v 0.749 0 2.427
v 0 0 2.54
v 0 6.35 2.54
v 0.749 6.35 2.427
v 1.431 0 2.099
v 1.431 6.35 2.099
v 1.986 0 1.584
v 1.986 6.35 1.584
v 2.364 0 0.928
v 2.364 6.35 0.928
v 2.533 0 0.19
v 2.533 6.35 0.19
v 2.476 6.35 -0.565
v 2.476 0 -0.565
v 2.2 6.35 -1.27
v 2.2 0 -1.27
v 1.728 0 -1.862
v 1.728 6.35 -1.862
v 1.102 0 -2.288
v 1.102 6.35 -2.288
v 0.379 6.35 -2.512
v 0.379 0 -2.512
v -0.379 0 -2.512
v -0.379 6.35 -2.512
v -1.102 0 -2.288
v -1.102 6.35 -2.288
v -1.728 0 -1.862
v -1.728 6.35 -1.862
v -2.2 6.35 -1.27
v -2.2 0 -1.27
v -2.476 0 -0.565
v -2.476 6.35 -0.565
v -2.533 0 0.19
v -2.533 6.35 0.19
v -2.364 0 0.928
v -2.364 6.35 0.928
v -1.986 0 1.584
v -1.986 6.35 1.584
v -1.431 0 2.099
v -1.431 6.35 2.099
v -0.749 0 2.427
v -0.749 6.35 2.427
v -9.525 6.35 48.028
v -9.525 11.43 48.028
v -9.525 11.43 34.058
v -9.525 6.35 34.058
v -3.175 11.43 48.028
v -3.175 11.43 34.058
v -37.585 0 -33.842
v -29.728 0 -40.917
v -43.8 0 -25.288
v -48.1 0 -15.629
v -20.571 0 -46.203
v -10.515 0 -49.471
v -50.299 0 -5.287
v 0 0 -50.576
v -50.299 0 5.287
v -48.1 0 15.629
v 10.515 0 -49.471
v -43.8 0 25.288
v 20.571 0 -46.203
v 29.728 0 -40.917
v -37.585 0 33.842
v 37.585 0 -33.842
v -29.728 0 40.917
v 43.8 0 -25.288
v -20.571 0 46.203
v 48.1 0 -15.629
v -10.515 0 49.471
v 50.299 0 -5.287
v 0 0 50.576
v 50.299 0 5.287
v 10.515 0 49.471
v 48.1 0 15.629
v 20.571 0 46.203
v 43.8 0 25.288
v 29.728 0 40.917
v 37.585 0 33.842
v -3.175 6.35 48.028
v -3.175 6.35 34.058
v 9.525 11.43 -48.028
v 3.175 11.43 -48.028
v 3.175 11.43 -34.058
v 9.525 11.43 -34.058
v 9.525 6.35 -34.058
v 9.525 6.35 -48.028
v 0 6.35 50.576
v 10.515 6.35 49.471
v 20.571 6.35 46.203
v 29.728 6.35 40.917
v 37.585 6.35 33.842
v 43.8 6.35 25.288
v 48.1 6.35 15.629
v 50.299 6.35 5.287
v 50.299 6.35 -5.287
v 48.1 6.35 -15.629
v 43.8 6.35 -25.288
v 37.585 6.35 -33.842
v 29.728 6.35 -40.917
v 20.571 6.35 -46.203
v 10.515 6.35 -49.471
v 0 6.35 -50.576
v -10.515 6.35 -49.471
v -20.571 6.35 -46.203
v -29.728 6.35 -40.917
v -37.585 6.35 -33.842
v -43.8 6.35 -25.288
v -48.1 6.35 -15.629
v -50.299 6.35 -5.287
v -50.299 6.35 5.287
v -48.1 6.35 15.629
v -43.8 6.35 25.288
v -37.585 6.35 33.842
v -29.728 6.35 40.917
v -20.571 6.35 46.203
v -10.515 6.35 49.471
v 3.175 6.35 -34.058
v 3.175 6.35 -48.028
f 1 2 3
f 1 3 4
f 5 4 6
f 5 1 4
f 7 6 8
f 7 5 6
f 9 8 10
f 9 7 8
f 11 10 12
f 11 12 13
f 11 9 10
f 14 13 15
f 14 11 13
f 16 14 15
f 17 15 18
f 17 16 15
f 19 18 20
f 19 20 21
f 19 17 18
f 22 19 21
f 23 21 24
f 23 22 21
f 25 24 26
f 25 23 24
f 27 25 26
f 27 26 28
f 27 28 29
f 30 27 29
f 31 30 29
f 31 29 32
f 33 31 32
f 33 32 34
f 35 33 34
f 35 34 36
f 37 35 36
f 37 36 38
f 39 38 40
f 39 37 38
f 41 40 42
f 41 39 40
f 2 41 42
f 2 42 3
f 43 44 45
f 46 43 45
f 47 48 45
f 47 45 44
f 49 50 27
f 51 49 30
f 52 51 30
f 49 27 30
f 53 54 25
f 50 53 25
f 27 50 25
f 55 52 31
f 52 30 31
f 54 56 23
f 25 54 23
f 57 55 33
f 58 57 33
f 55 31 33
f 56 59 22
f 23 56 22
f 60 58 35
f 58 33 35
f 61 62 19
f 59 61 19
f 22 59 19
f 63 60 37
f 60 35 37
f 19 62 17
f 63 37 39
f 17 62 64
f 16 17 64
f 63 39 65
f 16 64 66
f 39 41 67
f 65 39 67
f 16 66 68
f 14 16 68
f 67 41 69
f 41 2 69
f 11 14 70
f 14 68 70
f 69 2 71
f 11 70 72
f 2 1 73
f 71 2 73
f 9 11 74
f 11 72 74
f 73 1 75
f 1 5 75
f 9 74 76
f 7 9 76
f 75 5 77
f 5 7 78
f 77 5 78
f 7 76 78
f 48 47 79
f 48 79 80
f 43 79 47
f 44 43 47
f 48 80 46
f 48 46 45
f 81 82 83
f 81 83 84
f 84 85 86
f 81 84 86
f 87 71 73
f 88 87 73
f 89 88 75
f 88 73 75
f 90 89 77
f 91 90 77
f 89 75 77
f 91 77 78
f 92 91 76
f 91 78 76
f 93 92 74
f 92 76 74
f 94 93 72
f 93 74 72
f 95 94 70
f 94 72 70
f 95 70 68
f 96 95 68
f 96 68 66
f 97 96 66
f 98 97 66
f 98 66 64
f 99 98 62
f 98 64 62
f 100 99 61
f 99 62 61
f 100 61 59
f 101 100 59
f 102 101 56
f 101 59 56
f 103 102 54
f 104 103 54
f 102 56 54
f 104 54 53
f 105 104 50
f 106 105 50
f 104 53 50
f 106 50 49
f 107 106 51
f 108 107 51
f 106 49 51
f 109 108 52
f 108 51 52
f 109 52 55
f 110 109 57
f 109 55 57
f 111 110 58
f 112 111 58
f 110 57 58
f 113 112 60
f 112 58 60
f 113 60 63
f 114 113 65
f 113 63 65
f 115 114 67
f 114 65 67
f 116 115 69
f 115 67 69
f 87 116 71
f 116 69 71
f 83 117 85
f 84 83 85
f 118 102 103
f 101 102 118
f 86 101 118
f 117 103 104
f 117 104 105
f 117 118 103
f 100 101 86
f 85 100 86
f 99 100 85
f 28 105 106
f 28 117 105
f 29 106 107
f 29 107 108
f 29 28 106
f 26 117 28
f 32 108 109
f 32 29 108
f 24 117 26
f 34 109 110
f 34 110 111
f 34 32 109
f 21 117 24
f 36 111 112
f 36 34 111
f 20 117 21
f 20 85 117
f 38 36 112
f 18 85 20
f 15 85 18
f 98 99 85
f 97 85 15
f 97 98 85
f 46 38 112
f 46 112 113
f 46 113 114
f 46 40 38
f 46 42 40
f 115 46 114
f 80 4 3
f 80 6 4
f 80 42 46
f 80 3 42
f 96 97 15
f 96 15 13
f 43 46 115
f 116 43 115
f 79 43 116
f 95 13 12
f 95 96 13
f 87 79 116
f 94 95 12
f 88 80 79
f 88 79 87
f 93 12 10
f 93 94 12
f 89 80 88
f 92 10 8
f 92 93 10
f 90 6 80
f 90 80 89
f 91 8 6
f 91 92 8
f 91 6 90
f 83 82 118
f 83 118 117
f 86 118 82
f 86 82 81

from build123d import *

# Parameters (mm, degrees)
SKETCH1_R           = 50.575792326
SKETCH1_R_2         = 2.54
BOSS_EXTRUDE1_DEPTH = 6.35
SKETCH2_W           = 13.97
SKETCH2_H           = 5.08
BOSS_EXTRUDE3_DEPTH = 9.525
SKETCH3_W           = 13.97
SKETCH3_H           = 5.08
CUT_EXTRUDE1_DEPTH  = 3.175
CIRPATTERN2_COUNT   = 2
SKETCH4_W           = 13.97
SKETCH4_H           = 5.08
CUT_EXTRUDE2_DEPTH  = 3.175


with BuildPart() as part:
    # Sketch1 → Boss-Extrude1 (new body)
    with BuildSketch(Plane(origin=(0, 0, 0), x_dir=(1, 0, 0), z_dir=(0, 1, 0))):
        Circle(SKETCH1_R)
        Circle(SKETCH1_R_2, mode=Mode.SUBTRACT)
    extrude(amount=BOSS_EXTRUDE1_DEPTH)

    # Sketch2 → Boss-Extrude3 (add)
    with BuildSketch(Plane(origin=(0, 0, 0), x_dir=(0, 0, -1), z_dir=(1, 0, 0))):
        with Locations((-41.043352, 8.89)):
            Rectangle(SKETCH2_W, SKETCH2_H)
    boss_extrude3 = extrude(amount=-BOSS_EXTRUDE3_DEPTH)

    # Sketch3 → Cut-Extrude1 (cut)
    with BuildSketch(Plane(origin=(0, 0, 0), x_dir=(0, 0, -1), z_dir=(1, 0, 0))):
        with Locations((-41.043352, 8.89)):
            Rectangle(SKETCH3_W, SKETCH3_H)
    extrude(amount=-CUT_EXTRUDE1_DEPTH, mode=Mode.SUBTRACT)

    # CirPattern2: Boss-Extrude3 ×2 about axis
    cirpattern2_axis = Axis((0, 6.35, 0), (0, 1, 0))
    for i in range(1, CIRPATTERN2_COUNT):
        add(boss_extrude3.rotate(cirpattern2_axis, i * 360 / CIRPATTERN2_COUNT))

    # Sketch4 → Cut-Extrude2 (cut)
    with BuildSketch(Plane.ZY):
        with Locations((-41.043352, 8.89)):
            Rectangle(SKETCH4_W, SKETCH4_H)
    extrude(amount=-CUT_EXTRUDE2_DEPTH, mode=Mode.SUBTRACT)


solid = part.part
